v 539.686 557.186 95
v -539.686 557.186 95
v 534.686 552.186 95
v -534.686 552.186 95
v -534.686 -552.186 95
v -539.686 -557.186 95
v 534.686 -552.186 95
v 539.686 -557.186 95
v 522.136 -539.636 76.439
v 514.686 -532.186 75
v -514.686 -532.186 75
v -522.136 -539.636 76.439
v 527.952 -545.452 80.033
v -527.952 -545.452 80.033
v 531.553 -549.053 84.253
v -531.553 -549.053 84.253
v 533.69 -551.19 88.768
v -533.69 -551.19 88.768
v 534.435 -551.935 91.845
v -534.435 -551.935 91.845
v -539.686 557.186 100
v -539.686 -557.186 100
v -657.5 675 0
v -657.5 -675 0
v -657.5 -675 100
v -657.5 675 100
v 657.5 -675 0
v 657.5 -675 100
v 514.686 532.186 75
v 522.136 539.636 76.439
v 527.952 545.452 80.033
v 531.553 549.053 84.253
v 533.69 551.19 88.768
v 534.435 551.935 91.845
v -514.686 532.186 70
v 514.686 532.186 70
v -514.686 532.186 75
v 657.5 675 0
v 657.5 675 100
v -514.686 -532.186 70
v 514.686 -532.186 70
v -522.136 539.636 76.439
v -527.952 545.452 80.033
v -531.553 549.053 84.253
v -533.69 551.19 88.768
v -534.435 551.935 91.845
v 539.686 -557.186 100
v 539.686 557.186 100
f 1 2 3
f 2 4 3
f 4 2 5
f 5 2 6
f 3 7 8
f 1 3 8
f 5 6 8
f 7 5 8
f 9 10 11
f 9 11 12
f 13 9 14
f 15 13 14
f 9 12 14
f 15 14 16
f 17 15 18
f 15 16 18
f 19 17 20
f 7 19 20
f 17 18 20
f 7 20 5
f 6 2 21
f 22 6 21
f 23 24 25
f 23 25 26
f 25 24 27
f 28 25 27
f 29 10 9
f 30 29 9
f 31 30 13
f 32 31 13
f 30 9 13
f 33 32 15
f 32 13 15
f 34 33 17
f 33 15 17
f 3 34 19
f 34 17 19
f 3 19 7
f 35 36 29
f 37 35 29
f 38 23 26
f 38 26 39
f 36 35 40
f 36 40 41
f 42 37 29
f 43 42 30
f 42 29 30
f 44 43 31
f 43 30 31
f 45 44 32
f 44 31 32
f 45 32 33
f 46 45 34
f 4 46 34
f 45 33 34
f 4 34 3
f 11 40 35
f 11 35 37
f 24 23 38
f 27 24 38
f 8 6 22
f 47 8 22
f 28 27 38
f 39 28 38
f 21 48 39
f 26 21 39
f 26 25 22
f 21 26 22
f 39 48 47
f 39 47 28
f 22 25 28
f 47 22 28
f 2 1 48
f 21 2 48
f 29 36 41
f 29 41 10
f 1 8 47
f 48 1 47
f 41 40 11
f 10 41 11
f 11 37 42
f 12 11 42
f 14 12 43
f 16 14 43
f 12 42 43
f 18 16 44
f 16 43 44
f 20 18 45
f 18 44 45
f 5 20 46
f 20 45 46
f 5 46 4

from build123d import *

# Parameters (mm, degrees)
F0_W     = 1315
F0_H     = 1350
F1_DEPTH = 100
F2_W     = 1100
F2_H     = 1135
F3_DEPTH = 30


with BuildPart() as f1:
    # F0 (on Top) → F1 (new body)
    with BuildSketch(Plane.XY):
        Rectangle(F0_W, F0_H)
    extrude(amount=F1_DEPTH)

    # F2 (on face) → F3 (cut)
    with BuildSketch(Plane.XY.offset(100)):
        Rectangle(F2_W, F2_H)
    extrude(amount=-F3_DEPTH, mode=Mode.SUBTRACT)

    # F6: sweep along a path in F5
    with BuildLine(Plane.XY.offset(70)) as f6_path:
        Line((550, 567.5), (550, -567.5))
        Line((550, -567.5), (-550, -567.5))
        Line((-550, -567.5), (-550, 567.5))
        Line((-550, 567.5), (550, 567.5))
    # F4 (on Right) → F6 (sweep)
    with BuildSketch(Plane.YZ):
        with BuildLine():
            Line((-567.5, 100), (-567.5, 70))
            Line((-567.5, 70), (-532.1858882904, 70))
            Line((-532.1858882904, 70), (-532.1858882904, 75))
            ThreePointArc((-532.1858882904, 75), (-546.3280239141, 80.8578643763), (-552.1858882904, 95))
            Line((-552.1858882904, 95), (-557.1858882904, 95))
            Line((-557.1858882904, 95), (-557.1858882904, 100))
            Line((-557.1858882904, 100), (-567.5, 100))
        make_face()
    sweep(path=f6_path.line, transition=Transition.RIGHT)


solid = f1.part
